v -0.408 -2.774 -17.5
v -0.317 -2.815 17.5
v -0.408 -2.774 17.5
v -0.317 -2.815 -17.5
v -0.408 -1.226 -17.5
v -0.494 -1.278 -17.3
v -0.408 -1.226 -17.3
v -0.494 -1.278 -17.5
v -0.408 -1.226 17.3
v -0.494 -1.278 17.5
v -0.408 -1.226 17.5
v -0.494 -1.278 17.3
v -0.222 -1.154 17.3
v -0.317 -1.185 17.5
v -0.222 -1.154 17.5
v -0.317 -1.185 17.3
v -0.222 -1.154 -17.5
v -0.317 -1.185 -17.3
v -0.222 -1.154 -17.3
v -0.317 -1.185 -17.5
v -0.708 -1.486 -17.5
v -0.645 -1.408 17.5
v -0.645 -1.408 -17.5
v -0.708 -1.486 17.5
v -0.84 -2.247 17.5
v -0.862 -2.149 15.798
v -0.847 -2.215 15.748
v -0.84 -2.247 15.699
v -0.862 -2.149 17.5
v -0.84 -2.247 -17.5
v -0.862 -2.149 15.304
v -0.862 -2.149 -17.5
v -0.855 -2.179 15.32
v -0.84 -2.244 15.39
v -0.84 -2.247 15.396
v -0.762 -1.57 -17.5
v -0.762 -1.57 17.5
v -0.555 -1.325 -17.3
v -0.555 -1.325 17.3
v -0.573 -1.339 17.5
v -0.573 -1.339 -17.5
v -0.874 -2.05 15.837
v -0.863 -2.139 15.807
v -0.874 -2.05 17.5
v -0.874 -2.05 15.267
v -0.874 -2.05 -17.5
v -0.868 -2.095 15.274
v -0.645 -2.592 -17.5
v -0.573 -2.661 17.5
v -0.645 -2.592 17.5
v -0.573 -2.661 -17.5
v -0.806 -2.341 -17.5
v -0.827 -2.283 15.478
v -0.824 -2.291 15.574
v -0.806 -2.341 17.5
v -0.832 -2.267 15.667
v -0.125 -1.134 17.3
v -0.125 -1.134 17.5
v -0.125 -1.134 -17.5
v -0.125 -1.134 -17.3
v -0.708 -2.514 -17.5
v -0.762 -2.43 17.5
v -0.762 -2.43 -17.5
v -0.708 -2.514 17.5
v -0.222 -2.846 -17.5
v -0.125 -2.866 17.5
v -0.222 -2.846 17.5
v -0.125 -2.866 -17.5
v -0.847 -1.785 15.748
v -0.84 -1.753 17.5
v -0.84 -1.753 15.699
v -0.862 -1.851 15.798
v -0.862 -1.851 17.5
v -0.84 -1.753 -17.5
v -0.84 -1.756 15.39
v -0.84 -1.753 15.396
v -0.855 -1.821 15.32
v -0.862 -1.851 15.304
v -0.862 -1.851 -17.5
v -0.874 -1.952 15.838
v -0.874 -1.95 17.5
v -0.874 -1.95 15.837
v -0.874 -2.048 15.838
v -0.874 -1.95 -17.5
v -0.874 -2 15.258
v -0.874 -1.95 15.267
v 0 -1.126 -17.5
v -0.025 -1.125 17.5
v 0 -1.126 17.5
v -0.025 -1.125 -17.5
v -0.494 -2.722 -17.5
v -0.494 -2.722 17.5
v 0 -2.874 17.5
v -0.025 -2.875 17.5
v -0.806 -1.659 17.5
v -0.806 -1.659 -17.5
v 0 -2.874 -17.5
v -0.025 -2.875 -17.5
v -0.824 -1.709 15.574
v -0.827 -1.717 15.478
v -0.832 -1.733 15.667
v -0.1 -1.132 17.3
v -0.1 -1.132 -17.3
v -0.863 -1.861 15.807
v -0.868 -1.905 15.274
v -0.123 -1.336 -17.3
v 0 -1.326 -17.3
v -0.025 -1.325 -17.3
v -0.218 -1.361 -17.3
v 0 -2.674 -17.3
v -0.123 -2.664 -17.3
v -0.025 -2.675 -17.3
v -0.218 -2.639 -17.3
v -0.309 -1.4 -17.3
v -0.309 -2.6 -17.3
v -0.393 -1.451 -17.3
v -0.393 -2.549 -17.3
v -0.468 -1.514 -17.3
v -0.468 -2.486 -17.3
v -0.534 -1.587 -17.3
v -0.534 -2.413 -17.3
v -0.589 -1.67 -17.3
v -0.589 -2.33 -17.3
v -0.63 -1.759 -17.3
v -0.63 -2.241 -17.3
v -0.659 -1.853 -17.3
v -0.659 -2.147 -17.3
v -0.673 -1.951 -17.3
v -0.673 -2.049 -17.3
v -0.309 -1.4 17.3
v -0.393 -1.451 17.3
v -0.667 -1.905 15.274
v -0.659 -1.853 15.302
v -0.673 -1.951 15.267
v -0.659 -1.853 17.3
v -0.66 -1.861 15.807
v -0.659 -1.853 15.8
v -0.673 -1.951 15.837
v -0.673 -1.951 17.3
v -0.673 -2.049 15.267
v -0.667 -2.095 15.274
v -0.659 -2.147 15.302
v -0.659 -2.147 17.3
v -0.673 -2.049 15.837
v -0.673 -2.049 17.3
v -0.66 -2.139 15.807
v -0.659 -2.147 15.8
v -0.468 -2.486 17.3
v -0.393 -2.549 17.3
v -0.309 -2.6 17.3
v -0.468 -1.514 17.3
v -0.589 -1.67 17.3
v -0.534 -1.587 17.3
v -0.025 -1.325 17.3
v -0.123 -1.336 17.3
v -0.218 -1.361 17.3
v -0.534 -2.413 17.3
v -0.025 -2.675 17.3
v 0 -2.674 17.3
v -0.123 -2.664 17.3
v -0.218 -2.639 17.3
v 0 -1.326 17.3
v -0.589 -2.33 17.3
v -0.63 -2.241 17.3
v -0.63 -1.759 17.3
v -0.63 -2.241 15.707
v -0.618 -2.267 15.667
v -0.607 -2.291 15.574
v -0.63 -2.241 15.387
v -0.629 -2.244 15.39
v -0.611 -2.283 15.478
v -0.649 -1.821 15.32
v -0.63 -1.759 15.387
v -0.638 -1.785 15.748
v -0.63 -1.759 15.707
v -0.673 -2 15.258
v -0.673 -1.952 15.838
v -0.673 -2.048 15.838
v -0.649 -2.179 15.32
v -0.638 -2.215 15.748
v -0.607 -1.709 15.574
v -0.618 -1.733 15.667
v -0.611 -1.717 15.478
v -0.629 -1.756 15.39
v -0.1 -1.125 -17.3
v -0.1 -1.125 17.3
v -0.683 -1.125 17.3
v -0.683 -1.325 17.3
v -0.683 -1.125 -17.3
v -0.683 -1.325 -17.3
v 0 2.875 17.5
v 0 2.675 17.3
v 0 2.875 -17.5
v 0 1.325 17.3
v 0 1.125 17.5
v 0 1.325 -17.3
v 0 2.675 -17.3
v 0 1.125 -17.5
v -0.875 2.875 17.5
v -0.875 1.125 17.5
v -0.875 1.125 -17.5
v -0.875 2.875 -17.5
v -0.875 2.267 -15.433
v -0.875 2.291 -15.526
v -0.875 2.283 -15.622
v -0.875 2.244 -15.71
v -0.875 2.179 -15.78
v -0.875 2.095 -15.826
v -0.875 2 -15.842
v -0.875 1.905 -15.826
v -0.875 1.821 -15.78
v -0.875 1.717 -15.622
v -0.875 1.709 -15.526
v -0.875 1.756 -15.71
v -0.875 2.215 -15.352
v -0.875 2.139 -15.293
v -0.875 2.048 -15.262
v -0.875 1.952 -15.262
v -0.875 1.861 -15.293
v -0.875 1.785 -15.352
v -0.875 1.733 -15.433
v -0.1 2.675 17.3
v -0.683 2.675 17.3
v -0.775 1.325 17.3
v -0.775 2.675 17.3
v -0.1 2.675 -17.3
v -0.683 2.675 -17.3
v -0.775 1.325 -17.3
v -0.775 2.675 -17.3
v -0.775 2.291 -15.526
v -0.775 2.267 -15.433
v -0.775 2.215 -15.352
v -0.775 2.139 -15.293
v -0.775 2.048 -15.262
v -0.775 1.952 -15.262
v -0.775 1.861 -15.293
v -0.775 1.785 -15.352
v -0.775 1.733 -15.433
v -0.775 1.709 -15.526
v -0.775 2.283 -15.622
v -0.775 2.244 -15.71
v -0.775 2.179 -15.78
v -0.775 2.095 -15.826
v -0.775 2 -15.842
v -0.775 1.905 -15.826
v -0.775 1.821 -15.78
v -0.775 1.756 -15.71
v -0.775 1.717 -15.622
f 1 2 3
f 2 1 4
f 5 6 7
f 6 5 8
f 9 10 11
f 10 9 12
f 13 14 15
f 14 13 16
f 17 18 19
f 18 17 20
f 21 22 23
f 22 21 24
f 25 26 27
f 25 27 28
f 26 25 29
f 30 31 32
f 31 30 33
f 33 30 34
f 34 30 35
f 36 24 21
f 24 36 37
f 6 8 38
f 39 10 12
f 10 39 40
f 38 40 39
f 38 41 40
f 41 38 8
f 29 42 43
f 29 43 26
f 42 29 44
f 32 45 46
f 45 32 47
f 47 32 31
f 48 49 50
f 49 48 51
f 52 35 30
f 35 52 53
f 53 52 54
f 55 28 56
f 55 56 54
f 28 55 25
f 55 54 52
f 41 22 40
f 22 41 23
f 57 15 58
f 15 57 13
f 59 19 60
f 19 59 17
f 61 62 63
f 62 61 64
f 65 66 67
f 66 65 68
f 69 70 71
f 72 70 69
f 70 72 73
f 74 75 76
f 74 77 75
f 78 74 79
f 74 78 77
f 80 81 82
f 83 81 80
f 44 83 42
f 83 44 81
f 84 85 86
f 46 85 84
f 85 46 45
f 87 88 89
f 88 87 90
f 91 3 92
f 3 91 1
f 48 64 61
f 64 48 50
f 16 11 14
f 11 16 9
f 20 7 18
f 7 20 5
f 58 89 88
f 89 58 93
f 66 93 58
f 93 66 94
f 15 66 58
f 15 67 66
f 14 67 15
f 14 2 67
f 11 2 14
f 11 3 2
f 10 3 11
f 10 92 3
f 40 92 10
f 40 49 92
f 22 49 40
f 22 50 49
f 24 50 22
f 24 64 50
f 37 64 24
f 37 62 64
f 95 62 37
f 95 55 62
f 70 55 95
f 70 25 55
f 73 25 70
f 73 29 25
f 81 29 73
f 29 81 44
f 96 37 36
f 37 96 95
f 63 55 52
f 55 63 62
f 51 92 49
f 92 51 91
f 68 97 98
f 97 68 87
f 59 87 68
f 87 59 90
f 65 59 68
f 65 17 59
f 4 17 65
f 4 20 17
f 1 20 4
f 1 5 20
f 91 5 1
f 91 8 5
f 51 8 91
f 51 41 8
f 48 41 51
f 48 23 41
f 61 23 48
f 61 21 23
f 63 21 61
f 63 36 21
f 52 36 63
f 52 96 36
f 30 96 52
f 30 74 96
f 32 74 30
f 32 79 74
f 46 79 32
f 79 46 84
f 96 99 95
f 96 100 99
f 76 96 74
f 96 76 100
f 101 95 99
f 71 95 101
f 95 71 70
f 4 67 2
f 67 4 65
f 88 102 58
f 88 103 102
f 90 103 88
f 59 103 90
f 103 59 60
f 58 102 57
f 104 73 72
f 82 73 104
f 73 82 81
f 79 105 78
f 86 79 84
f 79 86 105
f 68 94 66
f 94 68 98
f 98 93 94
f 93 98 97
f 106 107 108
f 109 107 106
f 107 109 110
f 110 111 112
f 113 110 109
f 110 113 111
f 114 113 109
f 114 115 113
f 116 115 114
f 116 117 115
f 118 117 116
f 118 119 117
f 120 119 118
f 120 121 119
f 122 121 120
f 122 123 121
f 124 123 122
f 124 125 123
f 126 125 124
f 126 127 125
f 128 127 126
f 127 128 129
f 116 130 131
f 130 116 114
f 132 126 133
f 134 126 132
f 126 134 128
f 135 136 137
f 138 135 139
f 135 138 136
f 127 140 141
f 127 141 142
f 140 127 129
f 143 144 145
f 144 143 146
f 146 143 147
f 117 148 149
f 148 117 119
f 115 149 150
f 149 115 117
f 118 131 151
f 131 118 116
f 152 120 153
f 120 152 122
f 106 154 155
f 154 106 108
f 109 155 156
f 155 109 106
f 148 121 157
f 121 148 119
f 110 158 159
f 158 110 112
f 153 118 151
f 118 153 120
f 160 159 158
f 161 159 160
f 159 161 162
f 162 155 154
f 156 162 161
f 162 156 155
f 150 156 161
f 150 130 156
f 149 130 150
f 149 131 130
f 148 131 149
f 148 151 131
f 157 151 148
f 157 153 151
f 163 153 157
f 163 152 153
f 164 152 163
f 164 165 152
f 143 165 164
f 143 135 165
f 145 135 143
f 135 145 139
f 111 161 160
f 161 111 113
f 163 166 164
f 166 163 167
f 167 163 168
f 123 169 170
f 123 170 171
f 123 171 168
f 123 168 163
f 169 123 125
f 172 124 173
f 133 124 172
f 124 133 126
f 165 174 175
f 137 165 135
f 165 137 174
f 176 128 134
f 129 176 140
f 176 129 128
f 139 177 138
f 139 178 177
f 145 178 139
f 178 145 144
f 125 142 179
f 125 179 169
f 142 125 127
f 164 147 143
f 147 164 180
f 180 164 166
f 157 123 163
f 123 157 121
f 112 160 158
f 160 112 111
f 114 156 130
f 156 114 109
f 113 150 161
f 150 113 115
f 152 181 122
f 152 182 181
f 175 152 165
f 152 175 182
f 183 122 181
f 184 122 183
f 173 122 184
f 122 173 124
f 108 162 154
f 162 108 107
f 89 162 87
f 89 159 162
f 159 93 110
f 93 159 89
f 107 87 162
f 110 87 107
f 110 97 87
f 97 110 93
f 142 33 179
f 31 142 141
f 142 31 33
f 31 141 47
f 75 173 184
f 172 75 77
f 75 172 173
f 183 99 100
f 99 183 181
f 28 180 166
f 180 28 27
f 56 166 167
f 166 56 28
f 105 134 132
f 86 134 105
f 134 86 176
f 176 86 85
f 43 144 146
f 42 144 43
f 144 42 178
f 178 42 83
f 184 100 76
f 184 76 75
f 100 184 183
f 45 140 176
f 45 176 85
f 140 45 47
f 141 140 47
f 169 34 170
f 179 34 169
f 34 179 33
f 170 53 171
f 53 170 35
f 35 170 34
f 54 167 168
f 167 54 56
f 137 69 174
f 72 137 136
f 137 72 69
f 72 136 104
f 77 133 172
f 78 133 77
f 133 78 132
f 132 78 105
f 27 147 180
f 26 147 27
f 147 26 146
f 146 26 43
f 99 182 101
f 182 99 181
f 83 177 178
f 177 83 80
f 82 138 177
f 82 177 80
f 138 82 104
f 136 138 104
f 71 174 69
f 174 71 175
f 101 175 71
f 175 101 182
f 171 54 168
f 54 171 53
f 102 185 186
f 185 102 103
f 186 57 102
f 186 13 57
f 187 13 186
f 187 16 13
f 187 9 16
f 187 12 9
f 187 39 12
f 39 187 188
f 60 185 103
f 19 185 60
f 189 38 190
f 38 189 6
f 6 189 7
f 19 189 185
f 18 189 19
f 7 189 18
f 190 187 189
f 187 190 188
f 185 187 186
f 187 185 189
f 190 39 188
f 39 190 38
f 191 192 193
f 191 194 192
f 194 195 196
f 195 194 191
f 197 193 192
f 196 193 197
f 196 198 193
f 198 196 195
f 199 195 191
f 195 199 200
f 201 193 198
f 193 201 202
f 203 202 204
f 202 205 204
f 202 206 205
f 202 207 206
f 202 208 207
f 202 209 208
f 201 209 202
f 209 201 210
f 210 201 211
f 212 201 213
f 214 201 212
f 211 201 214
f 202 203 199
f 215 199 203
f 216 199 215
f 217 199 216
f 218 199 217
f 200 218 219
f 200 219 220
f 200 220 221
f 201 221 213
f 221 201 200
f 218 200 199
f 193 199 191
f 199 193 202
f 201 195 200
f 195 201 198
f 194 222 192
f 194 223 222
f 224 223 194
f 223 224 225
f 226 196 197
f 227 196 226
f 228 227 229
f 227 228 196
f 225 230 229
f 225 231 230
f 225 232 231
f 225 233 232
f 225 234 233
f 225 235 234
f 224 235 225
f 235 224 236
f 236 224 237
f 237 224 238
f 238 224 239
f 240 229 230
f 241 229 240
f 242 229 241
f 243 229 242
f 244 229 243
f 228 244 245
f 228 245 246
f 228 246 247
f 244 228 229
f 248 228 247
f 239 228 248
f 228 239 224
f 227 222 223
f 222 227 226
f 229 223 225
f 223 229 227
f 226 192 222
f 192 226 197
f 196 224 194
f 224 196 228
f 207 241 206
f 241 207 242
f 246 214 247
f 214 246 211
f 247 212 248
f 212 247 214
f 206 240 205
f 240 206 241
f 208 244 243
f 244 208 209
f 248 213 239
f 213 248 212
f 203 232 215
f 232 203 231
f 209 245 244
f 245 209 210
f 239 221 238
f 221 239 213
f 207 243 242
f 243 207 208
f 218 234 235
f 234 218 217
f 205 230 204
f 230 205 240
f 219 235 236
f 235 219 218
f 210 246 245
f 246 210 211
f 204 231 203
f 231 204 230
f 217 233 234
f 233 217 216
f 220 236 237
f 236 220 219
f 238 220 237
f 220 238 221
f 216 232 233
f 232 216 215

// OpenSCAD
/// @file mod_gutter.scad
///
/// @brief A gutter module
//
/// @author © Dave Harris 2022
///

$fa = 1;   // Fragment angle
$fs = 0.1; // Fragment size resolution


// local test

translate(
  [ 0, -2, 0 ]
) mod_gutter(
        length = 35
      , width  = 1.75
      , pipeEnd = "right"
  );

translate(
  [ 0, 2, 0 ]
) mod_gutter(
        profile = "square"
      , length = 35
      , width  = 1.75
  );


module mod_gutter(
         length
       , width
       , profile = "round"
       , pipeEnd = "left"
       , thickness = 0.2
      )
{
 innerLen = length - (thickness *2);
 halfWidth = width /2;

 pe = pipeEnd == "left"
    ? width - (innerLen /2)
    : (innerLen /2) - width ;   

 difference()
 {    
   if( profile == "round")
   {
    difference()
    {
      cylinder(
          h = length
        , r = halfWidth
        , center = true
      );

      cylinder(
          h = innerLen
        , r = halfWidth - thickness
        , center = true
      );

      translate( // remove half
         [ halfWidth
         , 0
         , 0 ]
      ) cube(
           [ width
           , width
           , length +0.01  ]
          , center = true
        );
    }
   }
   else // square profile
   {
    translate(
      [ - halfWidth /2
      , 0
      , 0  ]
    ) difference()
      {
        cube(
          [ halfWidth
          , width
          , length ]
         , center = true
        );
            
        translate( // remove half
          [ thickness /2
          , 0
          , 0  ]
        ) cube(
             [ halfWidth
             , width - (thickness *2)
             , innerLen ]
            , center = true
          );
      }   
   }

   translate( // hole for down pipe 
     [ -width
     , 0
     , pe  ]
   ) rotate( [ 0
             , 90
             , 0  ]
     ) cylinder( h = width
               , r = width /6 );
 }
 
 translate( // support plate
   [ -(( width /3) + (thickness /2))
   , (width /2) - thickness
   , - (innerLen /2) ]
 ) cube( 
     [ width /3 
     , thickness
     , innerLen  ]
   );
}



// eof
